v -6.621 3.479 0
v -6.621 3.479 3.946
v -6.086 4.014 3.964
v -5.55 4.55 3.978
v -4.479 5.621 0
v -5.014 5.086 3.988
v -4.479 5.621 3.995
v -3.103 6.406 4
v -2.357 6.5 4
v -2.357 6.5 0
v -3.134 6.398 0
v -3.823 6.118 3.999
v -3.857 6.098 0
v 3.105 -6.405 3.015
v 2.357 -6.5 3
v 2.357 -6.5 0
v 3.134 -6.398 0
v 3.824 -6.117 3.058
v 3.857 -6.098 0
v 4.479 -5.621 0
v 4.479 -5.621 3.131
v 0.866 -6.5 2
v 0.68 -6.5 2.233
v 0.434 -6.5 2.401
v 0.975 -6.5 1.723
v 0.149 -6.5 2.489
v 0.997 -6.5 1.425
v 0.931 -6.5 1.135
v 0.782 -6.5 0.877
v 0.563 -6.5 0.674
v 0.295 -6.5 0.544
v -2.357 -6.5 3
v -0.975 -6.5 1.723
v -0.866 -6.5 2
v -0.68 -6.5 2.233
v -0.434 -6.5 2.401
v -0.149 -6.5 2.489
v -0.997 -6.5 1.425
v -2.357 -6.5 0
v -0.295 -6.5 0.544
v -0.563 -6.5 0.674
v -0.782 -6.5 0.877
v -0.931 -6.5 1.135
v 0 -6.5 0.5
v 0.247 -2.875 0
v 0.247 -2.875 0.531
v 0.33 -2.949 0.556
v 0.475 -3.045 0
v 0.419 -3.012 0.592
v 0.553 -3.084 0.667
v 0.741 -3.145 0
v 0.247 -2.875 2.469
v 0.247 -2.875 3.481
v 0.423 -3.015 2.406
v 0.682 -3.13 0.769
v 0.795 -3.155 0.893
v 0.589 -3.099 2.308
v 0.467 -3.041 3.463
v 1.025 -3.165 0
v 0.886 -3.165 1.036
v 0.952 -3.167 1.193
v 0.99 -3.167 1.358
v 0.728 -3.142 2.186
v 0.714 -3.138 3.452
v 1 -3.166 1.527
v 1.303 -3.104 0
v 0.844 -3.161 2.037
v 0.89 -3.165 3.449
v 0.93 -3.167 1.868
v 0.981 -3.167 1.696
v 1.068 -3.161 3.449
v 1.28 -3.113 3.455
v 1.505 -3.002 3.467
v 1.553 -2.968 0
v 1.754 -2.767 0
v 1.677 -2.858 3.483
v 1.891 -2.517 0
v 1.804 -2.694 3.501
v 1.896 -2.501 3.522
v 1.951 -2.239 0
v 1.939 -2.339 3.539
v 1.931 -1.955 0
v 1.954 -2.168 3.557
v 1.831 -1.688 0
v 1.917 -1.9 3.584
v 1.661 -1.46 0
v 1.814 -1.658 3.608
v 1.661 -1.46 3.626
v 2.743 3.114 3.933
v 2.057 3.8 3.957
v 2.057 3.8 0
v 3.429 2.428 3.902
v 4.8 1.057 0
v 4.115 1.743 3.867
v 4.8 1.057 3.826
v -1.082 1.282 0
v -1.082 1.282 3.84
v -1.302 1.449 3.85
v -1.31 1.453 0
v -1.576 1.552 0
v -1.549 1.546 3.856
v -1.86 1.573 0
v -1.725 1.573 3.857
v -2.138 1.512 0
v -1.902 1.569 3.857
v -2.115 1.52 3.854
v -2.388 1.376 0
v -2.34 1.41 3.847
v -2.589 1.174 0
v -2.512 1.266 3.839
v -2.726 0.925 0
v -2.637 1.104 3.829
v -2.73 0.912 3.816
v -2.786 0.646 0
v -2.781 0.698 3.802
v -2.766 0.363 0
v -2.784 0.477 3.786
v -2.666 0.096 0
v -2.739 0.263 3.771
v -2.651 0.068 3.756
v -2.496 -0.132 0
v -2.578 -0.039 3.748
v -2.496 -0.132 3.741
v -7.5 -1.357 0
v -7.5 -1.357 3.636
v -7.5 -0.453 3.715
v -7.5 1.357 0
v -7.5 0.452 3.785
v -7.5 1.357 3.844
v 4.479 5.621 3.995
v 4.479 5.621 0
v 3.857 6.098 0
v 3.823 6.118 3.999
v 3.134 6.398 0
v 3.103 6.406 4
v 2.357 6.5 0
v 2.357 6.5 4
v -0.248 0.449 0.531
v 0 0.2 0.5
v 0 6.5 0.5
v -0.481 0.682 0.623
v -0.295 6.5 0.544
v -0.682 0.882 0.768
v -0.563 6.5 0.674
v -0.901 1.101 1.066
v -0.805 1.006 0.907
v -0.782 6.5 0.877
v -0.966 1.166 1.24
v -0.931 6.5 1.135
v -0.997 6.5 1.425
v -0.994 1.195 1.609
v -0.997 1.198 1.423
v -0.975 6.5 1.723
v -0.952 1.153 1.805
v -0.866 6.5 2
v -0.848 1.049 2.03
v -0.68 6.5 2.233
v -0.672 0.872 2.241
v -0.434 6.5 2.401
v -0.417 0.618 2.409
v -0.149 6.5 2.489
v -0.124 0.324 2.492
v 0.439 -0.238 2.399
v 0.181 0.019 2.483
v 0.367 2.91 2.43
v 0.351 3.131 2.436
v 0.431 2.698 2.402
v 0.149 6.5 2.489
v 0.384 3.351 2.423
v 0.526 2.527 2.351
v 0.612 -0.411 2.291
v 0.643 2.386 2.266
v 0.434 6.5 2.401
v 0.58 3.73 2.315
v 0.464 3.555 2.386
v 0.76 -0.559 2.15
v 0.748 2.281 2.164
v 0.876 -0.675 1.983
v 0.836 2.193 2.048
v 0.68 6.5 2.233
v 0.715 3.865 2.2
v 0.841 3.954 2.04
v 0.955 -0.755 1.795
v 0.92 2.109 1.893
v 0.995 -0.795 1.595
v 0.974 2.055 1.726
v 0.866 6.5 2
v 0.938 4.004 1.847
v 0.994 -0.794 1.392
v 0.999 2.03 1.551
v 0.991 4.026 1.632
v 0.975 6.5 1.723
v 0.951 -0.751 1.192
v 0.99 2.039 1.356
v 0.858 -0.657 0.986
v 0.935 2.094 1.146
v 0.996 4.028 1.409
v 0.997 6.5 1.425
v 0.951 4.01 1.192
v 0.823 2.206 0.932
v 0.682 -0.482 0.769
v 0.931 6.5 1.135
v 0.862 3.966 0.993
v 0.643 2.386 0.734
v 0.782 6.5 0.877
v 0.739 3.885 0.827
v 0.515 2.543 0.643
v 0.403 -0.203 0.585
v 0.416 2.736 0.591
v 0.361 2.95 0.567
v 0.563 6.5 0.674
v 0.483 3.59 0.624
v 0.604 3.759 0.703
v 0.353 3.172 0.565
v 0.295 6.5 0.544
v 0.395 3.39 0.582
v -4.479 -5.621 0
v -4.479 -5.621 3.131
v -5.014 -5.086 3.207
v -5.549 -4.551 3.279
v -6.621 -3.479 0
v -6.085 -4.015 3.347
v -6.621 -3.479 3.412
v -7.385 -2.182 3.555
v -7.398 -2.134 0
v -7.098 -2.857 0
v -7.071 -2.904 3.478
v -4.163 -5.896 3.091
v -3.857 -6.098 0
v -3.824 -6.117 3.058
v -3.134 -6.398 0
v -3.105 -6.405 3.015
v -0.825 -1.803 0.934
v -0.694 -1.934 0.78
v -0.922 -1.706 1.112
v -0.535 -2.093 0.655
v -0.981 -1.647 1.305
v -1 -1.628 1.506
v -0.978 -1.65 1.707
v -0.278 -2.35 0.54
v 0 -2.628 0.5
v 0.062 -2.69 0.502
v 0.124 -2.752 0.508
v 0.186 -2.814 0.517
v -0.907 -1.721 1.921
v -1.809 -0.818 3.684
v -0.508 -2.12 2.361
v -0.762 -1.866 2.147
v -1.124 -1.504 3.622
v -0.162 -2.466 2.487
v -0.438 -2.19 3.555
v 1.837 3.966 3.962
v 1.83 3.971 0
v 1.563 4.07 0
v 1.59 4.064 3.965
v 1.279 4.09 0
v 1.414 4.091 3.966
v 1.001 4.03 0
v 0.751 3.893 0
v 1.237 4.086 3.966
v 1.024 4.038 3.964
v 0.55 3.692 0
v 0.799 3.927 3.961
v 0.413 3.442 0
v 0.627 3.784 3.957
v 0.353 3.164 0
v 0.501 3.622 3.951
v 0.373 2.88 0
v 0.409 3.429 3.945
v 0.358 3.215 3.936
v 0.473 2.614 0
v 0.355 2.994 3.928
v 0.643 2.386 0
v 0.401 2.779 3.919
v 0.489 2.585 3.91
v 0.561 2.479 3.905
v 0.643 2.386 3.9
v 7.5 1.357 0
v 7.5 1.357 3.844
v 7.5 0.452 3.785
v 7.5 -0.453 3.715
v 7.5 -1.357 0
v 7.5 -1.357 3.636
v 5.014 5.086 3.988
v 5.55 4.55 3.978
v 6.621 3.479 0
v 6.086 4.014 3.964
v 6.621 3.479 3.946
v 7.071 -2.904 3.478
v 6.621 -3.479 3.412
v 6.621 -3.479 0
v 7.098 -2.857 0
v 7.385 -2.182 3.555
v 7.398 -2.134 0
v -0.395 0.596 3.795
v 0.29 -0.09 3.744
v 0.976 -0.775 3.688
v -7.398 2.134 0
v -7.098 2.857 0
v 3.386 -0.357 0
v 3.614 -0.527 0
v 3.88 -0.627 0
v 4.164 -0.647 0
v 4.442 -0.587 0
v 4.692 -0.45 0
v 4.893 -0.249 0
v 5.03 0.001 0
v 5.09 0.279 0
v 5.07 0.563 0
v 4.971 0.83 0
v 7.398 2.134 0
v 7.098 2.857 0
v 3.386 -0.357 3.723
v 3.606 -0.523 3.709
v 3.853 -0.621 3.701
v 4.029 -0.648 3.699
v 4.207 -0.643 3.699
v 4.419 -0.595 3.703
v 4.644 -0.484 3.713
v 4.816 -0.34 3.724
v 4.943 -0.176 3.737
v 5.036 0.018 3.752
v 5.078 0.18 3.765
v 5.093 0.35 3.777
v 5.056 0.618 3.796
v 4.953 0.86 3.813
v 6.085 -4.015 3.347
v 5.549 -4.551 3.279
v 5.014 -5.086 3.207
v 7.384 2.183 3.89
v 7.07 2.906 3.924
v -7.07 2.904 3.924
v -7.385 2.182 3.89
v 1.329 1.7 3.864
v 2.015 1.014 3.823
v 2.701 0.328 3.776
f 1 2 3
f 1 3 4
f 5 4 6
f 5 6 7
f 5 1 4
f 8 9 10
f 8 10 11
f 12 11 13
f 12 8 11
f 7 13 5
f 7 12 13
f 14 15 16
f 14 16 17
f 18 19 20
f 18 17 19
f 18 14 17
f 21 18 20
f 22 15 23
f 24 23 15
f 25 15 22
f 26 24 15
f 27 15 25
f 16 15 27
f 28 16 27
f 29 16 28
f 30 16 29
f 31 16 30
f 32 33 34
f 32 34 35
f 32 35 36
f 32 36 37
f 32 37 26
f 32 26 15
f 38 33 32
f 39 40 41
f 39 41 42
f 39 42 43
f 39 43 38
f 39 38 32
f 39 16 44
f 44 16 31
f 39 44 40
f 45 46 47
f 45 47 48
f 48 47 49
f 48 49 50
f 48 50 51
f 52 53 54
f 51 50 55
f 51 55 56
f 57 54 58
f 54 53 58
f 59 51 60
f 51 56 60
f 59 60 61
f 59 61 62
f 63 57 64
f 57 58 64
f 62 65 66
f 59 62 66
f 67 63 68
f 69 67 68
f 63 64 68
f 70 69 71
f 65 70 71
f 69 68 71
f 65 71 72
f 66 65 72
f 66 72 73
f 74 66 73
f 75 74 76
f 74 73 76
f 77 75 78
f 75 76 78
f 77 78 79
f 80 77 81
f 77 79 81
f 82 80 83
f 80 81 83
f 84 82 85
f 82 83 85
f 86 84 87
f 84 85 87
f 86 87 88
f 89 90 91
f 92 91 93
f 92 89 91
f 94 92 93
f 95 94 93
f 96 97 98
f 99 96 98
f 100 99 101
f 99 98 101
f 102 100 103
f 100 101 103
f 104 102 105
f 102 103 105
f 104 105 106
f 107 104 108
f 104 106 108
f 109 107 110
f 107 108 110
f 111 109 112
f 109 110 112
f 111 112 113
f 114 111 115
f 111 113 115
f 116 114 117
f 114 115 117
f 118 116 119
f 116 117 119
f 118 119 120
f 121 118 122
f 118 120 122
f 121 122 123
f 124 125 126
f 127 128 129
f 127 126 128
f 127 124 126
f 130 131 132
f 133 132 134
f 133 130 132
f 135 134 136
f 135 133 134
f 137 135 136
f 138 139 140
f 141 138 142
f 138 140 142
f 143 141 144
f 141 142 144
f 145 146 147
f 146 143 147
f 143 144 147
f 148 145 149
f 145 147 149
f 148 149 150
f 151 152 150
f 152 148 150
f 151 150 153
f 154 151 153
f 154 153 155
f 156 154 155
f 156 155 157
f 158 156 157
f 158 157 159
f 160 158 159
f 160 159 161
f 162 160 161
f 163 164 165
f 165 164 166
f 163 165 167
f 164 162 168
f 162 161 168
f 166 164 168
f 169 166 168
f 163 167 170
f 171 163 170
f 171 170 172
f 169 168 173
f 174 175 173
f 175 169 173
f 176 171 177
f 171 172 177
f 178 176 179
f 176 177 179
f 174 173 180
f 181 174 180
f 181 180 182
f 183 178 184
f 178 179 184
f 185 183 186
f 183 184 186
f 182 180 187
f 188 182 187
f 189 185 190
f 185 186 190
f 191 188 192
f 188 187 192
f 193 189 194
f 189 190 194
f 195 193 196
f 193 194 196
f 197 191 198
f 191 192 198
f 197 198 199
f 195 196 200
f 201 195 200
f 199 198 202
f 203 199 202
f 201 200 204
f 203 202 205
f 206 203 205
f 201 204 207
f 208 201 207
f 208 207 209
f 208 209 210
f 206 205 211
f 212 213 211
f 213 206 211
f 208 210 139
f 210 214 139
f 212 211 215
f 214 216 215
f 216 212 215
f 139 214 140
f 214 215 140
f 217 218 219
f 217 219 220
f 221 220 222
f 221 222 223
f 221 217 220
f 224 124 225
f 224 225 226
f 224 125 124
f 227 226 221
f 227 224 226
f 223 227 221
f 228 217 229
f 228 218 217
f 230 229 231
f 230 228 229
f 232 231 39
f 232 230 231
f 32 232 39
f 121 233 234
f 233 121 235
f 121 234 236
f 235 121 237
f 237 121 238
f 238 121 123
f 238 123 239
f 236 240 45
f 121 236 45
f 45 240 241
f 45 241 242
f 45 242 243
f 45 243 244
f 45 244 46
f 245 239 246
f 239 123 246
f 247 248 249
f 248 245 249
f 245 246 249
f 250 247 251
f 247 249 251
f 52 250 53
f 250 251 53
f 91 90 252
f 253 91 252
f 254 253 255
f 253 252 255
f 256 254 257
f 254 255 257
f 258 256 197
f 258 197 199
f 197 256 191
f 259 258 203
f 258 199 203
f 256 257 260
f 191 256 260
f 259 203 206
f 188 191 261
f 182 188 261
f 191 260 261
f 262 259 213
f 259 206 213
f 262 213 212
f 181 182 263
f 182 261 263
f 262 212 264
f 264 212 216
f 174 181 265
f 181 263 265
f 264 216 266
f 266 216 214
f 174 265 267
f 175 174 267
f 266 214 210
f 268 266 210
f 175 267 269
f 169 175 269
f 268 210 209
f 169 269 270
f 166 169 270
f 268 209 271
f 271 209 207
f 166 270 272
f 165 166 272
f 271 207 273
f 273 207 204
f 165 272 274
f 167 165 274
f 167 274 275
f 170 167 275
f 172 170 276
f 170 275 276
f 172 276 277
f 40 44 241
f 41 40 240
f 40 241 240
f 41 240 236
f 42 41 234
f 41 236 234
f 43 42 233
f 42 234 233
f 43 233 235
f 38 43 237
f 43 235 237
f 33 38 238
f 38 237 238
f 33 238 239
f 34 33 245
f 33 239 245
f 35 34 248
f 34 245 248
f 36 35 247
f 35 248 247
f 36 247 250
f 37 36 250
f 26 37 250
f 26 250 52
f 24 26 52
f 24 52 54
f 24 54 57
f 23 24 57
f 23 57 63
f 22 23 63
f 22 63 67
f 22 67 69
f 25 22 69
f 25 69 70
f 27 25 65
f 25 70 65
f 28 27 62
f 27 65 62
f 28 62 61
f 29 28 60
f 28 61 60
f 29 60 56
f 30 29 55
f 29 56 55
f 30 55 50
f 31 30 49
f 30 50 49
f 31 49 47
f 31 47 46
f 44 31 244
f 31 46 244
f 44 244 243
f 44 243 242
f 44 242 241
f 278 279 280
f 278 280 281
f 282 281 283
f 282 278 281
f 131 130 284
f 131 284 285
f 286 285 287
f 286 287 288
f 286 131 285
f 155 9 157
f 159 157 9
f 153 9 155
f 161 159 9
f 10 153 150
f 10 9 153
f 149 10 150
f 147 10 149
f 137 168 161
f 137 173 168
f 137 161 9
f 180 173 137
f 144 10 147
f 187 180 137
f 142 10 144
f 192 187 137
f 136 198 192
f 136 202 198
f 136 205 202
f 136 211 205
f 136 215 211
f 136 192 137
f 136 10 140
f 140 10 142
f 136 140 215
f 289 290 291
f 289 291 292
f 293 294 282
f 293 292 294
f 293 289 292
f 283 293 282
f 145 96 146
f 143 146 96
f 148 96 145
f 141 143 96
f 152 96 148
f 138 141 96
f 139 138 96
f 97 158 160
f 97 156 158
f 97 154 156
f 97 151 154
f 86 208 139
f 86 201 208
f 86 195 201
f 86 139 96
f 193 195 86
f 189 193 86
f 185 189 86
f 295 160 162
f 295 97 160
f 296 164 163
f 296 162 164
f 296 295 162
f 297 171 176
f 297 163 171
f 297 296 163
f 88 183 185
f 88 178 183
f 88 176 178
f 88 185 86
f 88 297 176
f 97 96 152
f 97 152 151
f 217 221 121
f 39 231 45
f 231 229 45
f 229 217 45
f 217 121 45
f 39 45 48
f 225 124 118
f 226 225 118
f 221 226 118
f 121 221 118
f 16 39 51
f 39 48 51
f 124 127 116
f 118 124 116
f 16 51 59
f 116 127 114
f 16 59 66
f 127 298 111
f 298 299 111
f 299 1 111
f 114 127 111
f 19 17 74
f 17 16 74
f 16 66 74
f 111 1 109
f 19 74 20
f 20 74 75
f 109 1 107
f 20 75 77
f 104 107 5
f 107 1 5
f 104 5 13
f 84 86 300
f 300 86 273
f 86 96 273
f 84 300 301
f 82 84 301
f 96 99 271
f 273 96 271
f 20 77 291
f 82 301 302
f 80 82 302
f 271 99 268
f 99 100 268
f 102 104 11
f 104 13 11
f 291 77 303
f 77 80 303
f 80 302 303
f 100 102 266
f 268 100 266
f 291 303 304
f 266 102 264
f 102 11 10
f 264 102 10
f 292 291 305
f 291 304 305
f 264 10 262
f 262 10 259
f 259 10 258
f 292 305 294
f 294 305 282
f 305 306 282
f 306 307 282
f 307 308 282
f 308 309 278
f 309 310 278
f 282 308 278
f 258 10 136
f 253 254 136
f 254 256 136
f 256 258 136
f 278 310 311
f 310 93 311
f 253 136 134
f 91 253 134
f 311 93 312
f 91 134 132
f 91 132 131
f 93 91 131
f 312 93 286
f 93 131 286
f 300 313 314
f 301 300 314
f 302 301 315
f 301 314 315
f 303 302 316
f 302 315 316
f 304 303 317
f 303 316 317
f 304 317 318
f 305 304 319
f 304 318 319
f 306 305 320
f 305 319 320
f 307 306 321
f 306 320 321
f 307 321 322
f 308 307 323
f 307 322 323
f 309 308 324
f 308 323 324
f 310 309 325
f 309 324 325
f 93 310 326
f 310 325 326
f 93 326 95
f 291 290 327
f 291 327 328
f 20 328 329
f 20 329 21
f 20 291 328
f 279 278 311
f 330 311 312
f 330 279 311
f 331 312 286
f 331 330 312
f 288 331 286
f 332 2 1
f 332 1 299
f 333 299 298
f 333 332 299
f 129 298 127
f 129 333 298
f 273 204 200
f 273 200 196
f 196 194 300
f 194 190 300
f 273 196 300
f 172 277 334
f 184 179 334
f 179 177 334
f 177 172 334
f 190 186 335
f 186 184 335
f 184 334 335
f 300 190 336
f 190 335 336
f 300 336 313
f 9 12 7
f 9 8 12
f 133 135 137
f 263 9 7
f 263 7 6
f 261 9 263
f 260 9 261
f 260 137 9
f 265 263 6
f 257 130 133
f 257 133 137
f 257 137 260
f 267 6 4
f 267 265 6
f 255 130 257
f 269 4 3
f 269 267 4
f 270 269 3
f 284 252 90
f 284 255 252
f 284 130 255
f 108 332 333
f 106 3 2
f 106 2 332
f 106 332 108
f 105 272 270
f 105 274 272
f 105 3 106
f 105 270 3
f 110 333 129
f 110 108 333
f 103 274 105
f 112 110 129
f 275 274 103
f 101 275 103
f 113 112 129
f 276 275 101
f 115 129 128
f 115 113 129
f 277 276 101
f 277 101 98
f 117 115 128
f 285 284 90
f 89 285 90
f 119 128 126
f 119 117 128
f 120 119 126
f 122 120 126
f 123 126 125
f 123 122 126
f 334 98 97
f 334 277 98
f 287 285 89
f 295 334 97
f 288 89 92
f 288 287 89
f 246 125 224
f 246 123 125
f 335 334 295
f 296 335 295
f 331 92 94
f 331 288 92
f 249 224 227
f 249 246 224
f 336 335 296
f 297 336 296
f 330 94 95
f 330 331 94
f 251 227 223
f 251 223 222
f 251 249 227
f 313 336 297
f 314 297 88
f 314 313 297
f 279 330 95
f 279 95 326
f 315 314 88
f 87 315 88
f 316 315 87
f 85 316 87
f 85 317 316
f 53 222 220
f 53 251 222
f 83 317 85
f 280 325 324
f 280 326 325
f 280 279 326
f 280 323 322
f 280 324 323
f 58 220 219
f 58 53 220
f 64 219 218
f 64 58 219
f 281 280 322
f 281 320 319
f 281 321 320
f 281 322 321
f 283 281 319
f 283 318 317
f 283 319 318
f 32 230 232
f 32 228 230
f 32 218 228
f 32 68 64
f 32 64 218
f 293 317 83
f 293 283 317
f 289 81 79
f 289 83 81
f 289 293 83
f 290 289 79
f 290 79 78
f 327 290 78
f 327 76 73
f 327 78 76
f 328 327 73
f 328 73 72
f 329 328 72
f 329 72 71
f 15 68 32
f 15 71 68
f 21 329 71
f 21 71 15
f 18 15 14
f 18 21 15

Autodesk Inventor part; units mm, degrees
ref_plane "YZ Plane" through (0, 0, 0) normal (1, 0, 0) x (0, 1, 0)
ref_plane "XZ Plane" through (0, 0, 0) normal (0, 1, 0) x (-1, 0, 0)
ref_plane "XY Plane" through (0, 0, 0) normal (0, 0, 1) x (1, 0, 0)
sketch "Base" plane through (0, 0, 0) normal (0, 0, 1) x (1, 0, 0)
  line L0 (-7.5, -2.6) -> (-7.5, 2.6)
  line L1 (-7.5, 2.6) -> (-3.6, 6.5)
  line L2 (-3.6, 6.5) -> (3.6, 6.5)
  line L3 (3.6, 6.5) -> (7.5, 2.6)
  line L4 (7.5, 2.6) -> (7.5, -2.6)
  line L5 (7.5, -2.6) -> (3.6, -6.5)
  line L6 (3.6, -6.5) -> (-3.6, -6.5)
  line L7 (-3.6, -6.5) -> (-7.5, -2.6)
  line L8 (-7.5, 0) -> (7.5, 0) construction
  line L9 (0, 6.5) -> (0, -6.5) construction
  point P0 (0, 0)
  point P1 (0, 0)
  dimension "d1" = 15
  dimension "d5" = 13
  dimension "d7" = 5.2
extrude "BaseFeature" add sketch "Base" along normal blind 4
fillet "BaseFilletsFeature" radius 3 8 edges at (-7.5, -2.6, 2) (-3.6, -6.5, 2) (3.6, -6.5, 2) (7.5, -2.6, 2) (7.5, 2.6, 2) (3.6, 6.5, 2) (-3.6, 6.5, 2) (-7.5, 2.6, 2)
sketch "RailHoles" plane through (0, 0, 4) normal (0, 0, 1) x (1, 0, 0)
  line L0 (1.3503, 3.0929) -> (4.0929, 0.3503) construction
  line L1 (-1.7888, 0.5751) -> (0.9538, -2.1675) construction
  line L2 (6.6213, 3.4787) -> (4.4787, 5.6213) construction
  line L3 (5.55, 4.55) -> (2.7216, 1.7216) construction
  circle A0 centre (1.3503, 3.0929) radius 1
  circle A1 centre (4.0929, 0.3503) radius 1
  circle A2 centre (-1.7888, 0.5751) radius 1
  circle A3 centre (0.9538, -2.1675) radius 1
  line L4 (2.0574, 3.8) -> (4.8, 1.0574)
  line L5 (0.6432, 2.3858) -> (3.3858, -0.3568)
  line L6 (-1.0817, 1.2822) -> (1.6609, -1.4604)
  line L7 (-2.4959, -0.132) -> (0.2467, -2.8746)
  dimension "d11" = 4
  dimension "d12" = 4
  dimension "d13" = 3.8786
  dimension "d14" = 2
  dimension "d15" = 1.5
  dimension "d25" = 3.0301
extrude "RailHolesFeature" cut sketch "RailHoles" against normal through all
sketch "RouteHole" plane through (-2.3574, -6.5, 0) normal (0, -1, 0) x (1, 0, 0)
  line L0 (4.7147, 4) -> (4.7147, 0) construction
  line L1 (0, 4) -> (4.7147, 4) construction
  line L2 (0, 0) -> (0, 4) construction
  line L3 (4.7147, 0) -> (0, 0) construction
  line L4 (0, 4) -> (0, 0) construction
  line L5 (0, 4) -> (4.7147, 4) construction
  line L6 (2.3574, 4) -> (2.3574, 0) construction
  line L7 (4.7147, 0) -> (0, 0) construction
  circle A0 centre (2.3574, 1.5) radius 1.25
  dimension "d40" = 2.5
  dimension "d41" = 1.5
hole "RouteHoleFeature" at (0, -6.5, 1.5) direction (0, 1, 0) diameter 2 end through all
sketch "SideProfile" plane through (7.5, -1.3574, 0) normal (1, 0, 0) x (0, 0, -1)
  arc A0 (-4, 7.8574) -> (-3, -5.1426) centre (81, 7.8574) ccw
  line L0 (-4, -5.1426) -> (0, -5.1426) construction
  line L1 (0, 7.8574) -> (-4, 7.8574) construction
  line L2 (-3, -5.1426) -> (0, -5.1426)
  line L3 (0, 7.8574) -> (0, -5.1426)
  line L4 (0, 7.8574) -> (0, 6.9787) projected
  line L5 (0, 7.8574) -> (-4, 7.8574)
  line L6 (-4, -2.1213) -> (-4, 0) construction
  dimension "d36" = 4
  dimension "d39" = 3
extrude "SideProfileFeature" cut sketch "SideProfile" against normal through all keep common part
equation "\"d7\" = 0.4 * d5"
equation "\"d12\" = 2 * d14"
equation "\"d13\" = 1.28 * d25"
properties part number "RingRouter"
